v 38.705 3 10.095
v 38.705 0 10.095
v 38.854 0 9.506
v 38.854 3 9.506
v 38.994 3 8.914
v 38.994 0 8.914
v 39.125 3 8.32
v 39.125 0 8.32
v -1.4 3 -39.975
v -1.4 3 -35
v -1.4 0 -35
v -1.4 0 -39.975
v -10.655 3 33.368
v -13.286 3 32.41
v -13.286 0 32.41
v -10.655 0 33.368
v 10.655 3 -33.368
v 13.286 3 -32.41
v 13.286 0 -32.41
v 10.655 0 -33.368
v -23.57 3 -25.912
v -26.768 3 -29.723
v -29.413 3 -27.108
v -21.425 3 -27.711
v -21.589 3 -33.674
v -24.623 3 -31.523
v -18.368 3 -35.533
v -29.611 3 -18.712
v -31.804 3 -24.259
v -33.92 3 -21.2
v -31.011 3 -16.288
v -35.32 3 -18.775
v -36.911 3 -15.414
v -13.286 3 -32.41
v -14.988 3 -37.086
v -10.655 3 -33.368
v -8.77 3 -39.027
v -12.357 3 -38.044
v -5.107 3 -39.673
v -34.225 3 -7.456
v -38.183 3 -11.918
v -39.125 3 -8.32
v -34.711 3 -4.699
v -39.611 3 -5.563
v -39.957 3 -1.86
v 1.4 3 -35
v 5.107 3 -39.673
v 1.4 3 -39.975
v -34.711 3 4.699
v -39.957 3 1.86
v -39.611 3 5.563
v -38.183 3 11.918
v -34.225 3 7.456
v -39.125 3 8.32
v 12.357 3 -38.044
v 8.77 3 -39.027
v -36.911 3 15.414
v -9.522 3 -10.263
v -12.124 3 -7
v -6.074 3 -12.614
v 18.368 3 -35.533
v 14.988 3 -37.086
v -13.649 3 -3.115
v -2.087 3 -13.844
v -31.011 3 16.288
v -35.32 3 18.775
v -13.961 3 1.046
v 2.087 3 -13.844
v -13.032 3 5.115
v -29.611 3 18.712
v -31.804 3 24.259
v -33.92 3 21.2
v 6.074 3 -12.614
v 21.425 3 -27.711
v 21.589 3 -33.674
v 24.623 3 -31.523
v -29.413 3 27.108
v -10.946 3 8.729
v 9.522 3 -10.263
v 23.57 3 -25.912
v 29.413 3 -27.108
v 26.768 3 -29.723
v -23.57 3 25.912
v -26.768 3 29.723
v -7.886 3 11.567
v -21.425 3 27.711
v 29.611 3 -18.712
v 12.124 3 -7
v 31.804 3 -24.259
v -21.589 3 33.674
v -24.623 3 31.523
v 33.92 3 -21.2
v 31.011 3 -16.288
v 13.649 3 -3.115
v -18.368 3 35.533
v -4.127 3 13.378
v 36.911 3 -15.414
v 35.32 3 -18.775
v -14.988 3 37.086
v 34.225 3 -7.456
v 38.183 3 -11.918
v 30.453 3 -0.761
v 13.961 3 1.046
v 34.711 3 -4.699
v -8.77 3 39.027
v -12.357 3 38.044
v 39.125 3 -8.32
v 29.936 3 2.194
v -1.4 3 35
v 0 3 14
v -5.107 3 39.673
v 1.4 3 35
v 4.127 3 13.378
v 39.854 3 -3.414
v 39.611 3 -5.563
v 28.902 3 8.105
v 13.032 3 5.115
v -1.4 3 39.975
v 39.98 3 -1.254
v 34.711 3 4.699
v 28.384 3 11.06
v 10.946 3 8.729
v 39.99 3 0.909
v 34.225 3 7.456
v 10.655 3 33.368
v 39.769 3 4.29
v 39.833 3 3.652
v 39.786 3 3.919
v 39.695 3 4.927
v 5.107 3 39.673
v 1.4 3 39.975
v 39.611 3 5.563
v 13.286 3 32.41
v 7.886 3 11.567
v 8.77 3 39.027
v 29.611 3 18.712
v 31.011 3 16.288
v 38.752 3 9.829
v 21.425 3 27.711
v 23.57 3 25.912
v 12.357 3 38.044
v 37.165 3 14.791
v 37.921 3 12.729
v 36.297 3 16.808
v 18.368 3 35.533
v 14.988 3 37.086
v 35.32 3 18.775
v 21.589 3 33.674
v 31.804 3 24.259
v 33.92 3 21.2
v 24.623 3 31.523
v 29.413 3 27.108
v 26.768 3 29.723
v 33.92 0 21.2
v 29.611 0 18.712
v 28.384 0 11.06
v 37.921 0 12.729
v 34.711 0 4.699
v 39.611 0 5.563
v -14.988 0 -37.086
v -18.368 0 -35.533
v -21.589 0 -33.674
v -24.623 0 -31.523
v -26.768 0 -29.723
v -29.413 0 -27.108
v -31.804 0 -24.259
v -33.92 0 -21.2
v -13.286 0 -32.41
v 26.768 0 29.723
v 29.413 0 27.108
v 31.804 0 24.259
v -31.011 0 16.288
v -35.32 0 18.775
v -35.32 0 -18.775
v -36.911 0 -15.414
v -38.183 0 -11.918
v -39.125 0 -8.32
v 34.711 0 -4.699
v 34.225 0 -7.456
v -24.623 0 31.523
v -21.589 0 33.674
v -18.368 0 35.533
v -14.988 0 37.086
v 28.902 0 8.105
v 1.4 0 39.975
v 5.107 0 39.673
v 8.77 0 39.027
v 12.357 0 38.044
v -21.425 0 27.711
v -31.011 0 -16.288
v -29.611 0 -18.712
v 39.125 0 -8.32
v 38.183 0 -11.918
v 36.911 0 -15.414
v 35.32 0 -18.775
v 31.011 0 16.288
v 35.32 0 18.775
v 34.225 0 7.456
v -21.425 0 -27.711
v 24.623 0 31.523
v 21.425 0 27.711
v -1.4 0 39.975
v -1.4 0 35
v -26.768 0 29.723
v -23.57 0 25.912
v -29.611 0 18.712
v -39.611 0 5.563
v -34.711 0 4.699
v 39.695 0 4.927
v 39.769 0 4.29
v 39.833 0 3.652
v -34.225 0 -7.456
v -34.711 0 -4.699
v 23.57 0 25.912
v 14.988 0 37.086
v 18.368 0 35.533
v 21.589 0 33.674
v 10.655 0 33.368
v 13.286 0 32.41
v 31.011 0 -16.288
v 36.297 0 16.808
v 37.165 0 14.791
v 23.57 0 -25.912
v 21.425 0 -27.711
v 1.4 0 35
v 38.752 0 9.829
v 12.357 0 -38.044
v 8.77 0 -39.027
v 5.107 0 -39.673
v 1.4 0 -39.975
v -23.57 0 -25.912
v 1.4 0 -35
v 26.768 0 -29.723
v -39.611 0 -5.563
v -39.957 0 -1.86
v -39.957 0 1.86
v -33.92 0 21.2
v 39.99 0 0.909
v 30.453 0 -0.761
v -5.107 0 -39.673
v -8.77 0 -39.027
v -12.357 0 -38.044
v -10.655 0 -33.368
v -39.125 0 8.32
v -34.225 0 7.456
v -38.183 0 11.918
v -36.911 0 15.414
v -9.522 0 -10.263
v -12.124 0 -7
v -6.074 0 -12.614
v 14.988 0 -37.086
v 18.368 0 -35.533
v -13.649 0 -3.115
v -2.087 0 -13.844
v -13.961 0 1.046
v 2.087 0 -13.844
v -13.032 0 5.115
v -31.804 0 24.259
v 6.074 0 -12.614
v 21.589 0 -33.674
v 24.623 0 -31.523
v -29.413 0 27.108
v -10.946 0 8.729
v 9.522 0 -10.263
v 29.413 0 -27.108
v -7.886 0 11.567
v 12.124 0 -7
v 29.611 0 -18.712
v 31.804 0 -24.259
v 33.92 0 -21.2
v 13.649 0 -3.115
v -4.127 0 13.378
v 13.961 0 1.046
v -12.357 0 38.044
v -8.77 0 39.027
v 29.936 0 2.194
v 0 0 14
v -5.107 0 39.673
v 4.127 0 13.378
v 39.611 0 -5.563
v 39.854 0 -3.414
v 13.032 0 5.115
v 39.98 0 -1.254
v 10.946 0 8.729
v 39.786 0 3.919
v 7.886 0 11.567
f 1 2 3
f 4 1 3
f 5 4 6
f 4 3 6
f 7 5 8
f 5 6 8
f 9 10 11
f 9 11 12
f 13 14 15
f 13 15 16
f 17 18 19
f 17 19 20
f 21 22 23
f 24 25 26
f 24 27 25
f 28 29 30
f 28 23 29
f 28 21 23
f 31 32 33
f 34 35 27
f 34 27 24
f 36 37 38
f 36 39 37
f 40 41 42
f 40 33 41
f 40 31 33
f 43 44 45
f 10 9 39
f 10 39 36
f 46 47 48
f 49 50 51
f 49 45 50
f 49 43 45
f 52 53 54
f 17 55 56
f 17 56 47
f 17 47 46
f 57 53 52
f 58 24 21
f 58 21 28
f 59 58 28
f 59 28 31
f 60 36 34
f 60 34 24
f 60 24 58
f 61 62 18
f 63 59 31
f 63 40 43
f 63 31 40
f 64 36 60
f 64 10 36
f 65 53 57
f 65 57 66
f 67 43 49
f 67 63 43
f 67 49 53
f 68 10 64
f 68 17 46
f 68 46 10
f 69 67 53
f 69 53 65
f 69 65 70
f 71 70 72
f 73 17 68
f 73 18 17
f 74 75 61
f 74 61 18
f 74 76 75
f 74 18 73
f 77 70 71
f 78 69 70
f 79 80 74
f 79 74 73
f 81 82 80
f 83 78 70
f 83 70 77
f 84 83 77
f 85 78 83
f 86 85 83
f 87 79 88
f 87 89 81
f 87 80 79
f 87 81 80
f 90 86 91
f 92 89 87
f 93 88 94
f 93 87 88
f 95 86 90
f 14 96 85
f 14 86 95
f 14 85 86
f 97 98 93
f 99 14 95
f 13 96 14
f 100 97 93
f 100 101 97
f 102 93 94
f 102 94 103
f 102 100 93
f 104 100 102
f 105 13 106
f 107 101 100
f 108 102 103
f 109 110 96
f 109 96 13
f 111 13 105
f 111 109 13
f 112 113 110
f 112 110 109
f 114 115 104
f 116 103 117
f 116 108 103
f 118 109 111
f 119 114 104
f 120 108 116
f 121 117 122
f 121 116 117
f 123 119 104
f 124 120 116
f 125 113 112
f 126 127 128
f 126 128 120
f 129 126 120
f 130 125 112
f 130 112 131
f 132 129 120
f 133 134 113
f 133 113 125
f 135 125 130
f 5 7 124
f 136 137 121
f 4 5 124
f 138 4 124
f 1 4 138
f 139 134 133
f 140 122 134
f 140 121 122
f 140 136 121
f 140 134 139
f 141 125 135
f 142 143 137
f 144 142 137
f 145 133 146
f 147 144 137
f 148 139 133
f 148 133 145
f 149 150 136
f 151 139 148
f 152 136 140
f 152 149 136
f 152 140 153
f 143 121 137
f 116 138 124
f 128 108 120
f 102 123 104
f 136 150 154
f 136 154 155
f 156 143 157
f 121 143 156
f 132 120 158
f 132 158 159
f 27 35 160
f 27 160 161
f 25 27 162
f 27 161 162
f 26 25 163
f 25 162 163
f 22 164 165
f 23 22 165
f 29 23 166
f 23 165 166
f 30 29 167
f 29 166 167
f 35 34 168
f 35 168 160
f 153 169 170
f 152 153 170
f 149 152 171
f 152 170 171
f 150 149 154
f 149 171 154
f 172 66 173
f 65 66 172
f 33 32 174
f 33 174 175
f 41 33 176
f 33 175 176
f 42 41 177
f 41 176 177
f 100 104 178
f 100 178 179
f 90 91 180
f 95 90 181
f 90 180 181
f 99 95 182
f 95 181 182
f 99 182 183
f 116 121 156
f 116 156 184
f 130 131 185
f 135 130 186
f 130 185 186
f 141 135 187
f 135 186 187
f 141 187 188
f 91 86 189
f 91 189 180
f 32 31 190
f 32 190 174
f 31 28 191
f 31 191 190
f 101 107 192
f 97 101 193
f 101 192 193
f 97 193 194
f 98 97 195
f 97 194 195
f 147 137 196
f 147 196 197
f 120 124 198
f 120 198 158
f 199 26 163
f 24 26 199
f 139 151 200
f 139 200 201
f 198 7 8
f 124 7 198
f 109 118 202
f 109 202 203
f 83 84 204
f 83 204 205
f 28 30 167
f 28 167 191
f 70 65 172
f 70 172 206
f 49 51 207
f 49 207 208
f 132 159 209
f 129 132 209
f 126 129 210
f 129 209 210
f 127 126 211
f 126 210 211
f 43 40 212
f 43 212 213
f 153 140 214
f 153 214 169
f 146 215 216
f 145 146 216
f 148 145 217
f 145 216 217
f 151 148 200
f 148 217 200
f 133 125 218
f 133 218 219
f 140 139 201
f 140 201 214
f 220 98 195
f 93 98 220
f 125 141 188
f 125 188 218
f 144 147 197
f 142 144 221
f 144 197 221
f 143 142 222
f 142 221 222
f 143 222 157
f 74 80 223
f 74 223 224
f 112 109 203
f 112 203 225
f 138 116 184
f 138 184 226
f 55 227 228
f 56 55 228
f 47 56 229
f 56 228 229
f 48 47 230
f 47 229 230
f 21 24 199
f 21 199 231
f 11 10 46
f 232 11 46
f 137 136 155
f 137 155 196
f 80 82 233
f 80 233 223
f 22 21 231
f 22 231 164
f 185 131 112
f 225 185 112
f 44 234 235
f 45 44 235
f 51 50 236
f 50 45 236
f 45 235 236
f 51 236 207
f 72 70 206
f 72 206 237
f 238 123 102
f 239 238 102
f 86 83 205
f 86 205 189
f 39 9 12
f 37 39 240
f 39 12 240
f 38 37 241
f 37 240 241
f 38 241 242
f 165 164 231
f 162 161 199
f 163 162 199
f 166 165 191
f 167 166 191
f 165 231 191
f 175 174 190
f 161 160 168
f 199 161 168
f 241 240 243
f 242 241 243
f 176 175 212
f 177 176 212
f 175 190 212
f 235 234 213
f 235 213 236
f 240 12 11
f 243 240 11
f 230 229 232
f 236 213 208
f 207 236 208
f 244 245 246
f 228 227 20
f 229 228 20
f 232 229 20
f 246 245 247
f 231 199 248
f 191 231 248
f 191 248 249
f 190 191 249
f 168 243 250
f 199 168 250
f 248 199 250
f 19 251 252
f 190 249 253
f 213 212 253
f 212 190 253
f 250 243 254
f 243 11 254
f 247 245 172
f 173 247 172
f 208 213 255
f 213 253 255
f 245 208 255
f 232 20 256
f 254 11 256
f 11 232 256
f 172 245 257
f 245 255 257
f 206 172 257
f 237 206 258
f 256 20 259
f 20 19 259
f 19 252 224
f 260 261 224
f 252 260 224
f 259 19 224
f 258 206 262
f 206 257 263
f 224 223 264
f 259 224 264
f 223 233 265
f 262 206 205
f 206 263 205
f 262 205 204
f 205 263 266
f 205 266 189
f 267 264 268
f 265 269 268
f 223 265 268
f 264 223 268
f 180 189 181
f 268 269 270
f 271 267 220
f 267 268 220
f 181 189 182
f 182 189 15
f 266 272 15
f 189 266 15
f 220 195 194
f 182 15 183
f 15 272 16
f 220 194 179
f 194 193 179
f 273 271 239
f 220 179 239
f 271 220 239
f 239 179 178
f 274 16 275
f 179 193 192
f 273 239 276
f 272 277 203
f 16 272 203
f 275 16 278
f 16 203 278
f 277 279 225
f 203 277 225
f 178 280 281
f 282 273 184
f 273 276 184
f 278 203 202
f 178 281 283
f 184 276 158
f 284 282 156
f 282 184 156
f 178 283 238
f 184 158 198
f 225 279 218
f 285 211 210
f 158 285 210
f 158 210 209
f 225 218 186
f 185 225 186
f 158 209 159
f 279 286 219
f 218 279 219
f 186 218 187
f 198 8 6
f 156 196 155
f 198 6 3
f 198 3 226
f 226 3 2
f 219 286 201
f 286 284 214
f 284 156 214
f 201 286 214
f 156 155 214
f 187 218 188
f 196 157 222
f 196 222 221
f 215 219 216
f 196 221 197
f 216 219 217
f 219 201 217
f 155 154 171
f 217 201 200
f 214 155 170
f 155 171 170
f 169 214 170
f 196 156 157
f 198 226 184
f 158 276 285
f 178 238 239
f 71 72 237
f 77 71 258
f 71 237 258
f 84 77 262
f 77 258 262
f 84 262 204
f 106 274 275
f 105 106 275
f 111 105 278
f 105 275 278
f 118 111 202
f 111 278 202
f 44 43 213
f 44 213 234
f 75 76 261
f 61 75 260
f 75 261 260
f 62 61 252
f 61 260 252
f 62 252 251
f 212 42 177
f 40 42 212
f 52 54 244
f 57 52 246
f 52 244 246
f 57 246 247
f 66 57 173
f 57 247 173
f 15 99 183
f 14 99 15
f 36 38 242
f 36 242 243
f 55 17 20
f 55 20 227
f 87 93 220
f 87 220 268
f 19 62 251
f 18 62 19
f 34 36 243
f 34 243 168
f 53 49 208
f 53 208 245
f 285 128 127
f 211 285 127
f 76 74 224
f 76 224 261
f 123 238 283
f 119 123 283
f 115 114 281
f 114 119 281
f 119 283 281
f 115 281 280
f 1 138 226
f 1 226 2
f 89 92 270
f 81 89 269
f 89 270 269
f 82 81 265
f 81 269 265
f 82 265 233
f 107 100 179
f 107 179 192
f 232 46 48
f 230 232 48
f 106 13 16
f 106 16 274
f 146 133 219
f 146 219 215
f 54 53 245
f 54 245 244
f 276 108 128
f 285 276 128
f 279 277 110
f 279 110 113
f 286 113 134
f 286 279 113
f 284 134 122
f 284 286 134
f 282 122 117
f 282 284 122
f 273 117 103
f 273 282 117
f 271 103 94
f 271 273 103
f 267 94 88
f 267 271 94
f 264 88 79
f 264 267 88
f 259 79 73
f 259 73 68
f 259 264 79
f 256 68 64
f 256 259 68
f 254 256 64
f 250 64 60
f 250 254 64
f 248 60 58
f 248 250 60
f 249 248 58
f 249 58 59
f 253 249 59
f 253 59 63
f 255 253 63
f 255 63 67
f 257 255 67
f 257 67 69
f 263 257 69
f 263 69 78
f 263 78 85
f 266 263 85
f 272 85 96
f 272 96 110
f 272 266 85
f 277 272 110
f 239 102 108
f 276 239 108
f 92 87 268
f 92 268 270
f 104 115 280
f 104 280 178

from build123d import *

# Parameters (mm, degrees)
ESQUISSE1_R             = 40
ESQUISSE1_R_2           = 14
BOSS_EXTRU_1_DEPTH      = 3
ENL_V_MAT_EXTRU_1_REACH = 58.648
ESQUISSE2_W             = 2.8
ESQUISSE2_H             = 5
ENL_V_MAT_EXTRU_2_DEPTH = 10


with BuildPart() as part:
    # Esquisse1 → Boss.-Extru.1 (new body)
    with BuildSketch(Plane(origin=(0, 0, 0), x_dir=(1, 0, 0), z_dir=(0, 1, 0))):
        with Locations(Location((0, 0, 0), (0, 0, 270))):
            Circle(ESQUISSE1_R)
        with Locations(Location((0, 0, 0), (0, 0, 270))):
            Circle(ESQUISSE1_R_2, mode=Mode.SUBTRACT)
    extrude(amount=BOSS_EXTRU_1_DEPTH)

    # Esquisse2 → Enlèv. mat.-Extru.1 (cut, up to next)
    with BuildSketch(Plane(origin=(0, 3, 0), x_dir=(1, 0, 0), z_dir=(0, 1, 0)), mode=Mode.PRIVATE) as enl_v_mat_extru_1_sk1:
        Polygon((14.996375402, 37.108876631), (13.286274685, 32.410413527), (10.655135347, 33.368069928), (12.365236064, 38.066533032), align=None)
    enl_v_mat_extru_1_tool1 = extrude(enl_v_mat_extru_1_sk1.sketch, amount=-ENL_V_MAT_EXTRU_1_REACH, mode=Mode.PRIVATE) & part.part
    # Esquisse2 → Enlèv. mat.-Extru.1 (cut, up to next)
    with BuildSketch(Plane(origin=(0, 3, 0), x_dir=(1, 0, 0), z_dir=(0, 1, 0)), mode=Mode.PRIVATE) as enl_v_mat_extru_1_sk2:
        with Locations((0, 37.5)):
            Rectangle(ESQUISSE2_W, ESQUISSE2_H)
    enl_v_mat_extru_1_tool2 = extrude(enl_v_mat_extru_1_sk2.sketch, amount=-ENL_V_MAT_EXTRU_1_REACH, mode=Mode.PRIVATE) & part.part
    # Esquisse2 → Enlèv. mat.-Extru.1 (cut, up to next)
    with BuildSketch(Plane(origin=(0, 3, 0), x_dir=(1, 0, 0), z_dir=(0, 1, 0)), mode=Mode.PRIVATE) as enl_v_mat_extru_1_sk3:
        Polygon((26.783966608, 29.741875071), (23.570028559, 25.911652856), (21.425104119, 27.711458163), (24.639042167, 31.541680378), align=None)
    enl_v_mat_extru_1_tool3 = extrude(enl_v_mat_extru_1_sk3.sketch, amount=-ENL_V_MAT_EXTRU_1_REACH, mode=Mode.PRIVATE) & part.part
    # Esquisse2 → Enlèv. mat.-Extru.1 (cut, up to next)
    with BuildSketch(Plane(origin=(0, 3, 0), x_dir=(1, 0, 0), z_dir=(0, 1, 0)), mode=Mode.PRIVATE) as enl_v_mat_extru_1_sk4:
        Polygon((35.341016151, 18.787564435), (31.010889132, 16.287564435), (29.610889132, 18.712435565), (33.941016151, 21.212435565), align=None)
    enl_v_mat_extru_1_tool4 = extrude(enl_v_mat_extru_1_sk4.sketch, amount=-ENL_V_MAT_EXTRU_1_REACH, mode=Mode.PRIVATE) & part.part
    # Esquisse2 → Enlèv. mat.-Extru.1 (cut, up to next)
    with BuildSketch(Plane(origin=(0, 3, 0), x_dir=(1, 0, 0), z_dir=(0, 1, 0)), mode=Mode.PRIVATE) as enl_v_mat_extru_1_sk5:
        Polygon((39.635417569, 5.567196252), (34.711378804, 4.698955364), (34.225163907, 7.456417073), (39.149202672, 8.324657961), align=None)
    enl_v_mat_extru_1_tool5 = extrude(enl_v_mat_extru_1_sk5.sketch, amount=-ENL_V_MAT_EXTRU_1_REACH, mode=Mode.PRIVATE) & part.part
    # Esquisse2 → Enlèv. mat.-Extru.1 (cut, up to next)
    with BuildSketch(Plane(origin=(0, 3, 0), x_dir=(1, 0, 0), z_dir=(0, 1, 0)), mode=Mode.PRIVATE) as enl_v_mat_extru_1_sk6:
        Polygon((39.149202672, -8.324657961), (34.225163907, -7.456417073), (34.711378804, -4.698955364), (39.635417569, -5.567196252), align=None)
    enl_v_mat_extru_1_tool6 = extrude(enl_v_mat_extru_1_sk6.sketch, amount=-ENL_V_MAT_EXTRU_1_REACH, mode=Mode.PRIVATE) & part.part
    # Esquisse2 → Enlèv. mat.-Extru.1 (cut, up to next)
    with BuildSketch(Plane(origin=(0, 3, 0), x_dir=(1, 0, 0), z_dir=(0, 1, 0)), mode=Mode.PRIVATE) as enl_v_mat_extru_1_sk7:
        Polygon((33.941016151, -21.212435565), (29.610889132, -18.712435565), (31.010889132, -16.287564435), (35.341016151, -18.787564435), align=None)
    enl_v_mat_extru_1_tool7 = extrude(enl_v_mat_extru_1_sk7.sketch, amount=-ENL_V_MAT_EXTRU_1_REACH, mode=Mode.PRIVATE) & part.part
    # Esquisse2 → Enlèv. mat.-Extru.1 (cut, up to next)
    with BuildSketch(Plane(origin=(0, 3, 0), x_dir=(1, 0, 0), z_dir=(0, 1, 0)), mode=Mode.PRIVATE) as enl_v_mat_extru_1_sk8:
        Polygon((24.639042167, -31.541680378), (21.425104119, -27.711458163), (23.570028559, -25.911652856), (26.783966608, -29.741875071), align=None)
    enl_v_mat_extru_1_tool8 = extrude(enl_v_mat_extru_1_sk8.sketch, amount=-ENL_V_MAT_EXTRU_1_REACH, mode=Mode.PRIVATE) & part.part
    # Esquisse2 → Enlèv. mat.-Extru.1 (cut, up to next)
    with BuildSketch(Plane(origin=(0, 3, 0), x_dir=(1, 0, 0), z_dir=(0, 1, 0)), mode=Mode.PRIVATE) as enl_v_mat_extru_1_sk9:
        Polygon((12.365236064, -38.066533032), (10.655135347, -33.368069928), (13.286274686, -32.410413527), (14.996375402, -37.108876631), align=None)
    enl_v_mat_extru_1_tool9 = extrude(enl_v_mat_extru_1_sk9.sketch, amount=-ENL_V_MAT_EXTRU_1_REACH, mode=Mode.PRIVATE) & part.part
    # Esquisse2 → Enlèv. mat.-Extru.1 (cut, up to next)
    with BuildSketch(Plane(origin=(0, 3, 0), x_dir=(1, 0, 0), z_dir=(0, 1, 0)), mode=Mode.PRIVATE) as enl_v_mat_extru_1_sk10:
        with Locations((0, -37.5)):
            Rectangle(ESQUISSE2_W, ESQUISSE2_H)
    enl_v_mat_extru_1_tool10 = extrude(enl_v_mat_extru_1_sk10.sketch, amount=-ENL_V_MAT_EXTRU_1_REACH, mode=Mode.PRIVATE) & part.part
    # Esquisse2 → Enlèv. mat.-Extru.1 (cut, up to next)
    with BuildSketch(Plane(origin=(0, 3, 0), x_dir=(1, 0, 0), z_dir=(0, 1, 0)), mode=Mode.PRIVATE) as enl_v_mat_extru_1_sk11:
        Polygon((-14.996375402, -37.108876631), (-13.286274685, -32.410413527), (-10.655135347, -33.368069928), (-12.365236064, -38.066533032), align=None)
    enl_v_mat_extru_1_tool11 = extrude(enl_v_mat_extru_1_sk11.sketch, amount=-ENL_V_MAT_EXTRU_1_REACH, mode=Mode.PRIVATE) & part.part
    # Esquisse2 → Enlèv. mat.-Extru.1 (cut, up to next)
    with BuildSketch(Plane(origin=(0, 3, 0), x_dir=(1, 0, 0), z_dir=(0, 1, 0)), mode=Mode.PRIVATE) as enl_v_mat_extru_1_sk12:
        Polygon((-26.783966608, -29.741875071), (-23.570028559, -25.911652856), (-21.425104119, -27.711458163), (-24.639042167, -31.541680378), align=None)
    enl_v_mat_extru_1_tool12 = extrude(enl_v_mat_extru_1_sk12.sketch, amount=-ENL_V_MAT_EXTRU_1_REACH, mode=Mode.PRIVATE) & part.part
    # Esquisse2 → Enlèv. mat.-Extru.1 (cut, up to next)
    with BuildSketch(Plane(origin=(0, 3, 0), x_dir=(1, 0, 0), z_dir=(0, 1, 0)), mode=Mode.PRIVATE) as enl_v_mat_extru_1_sk13:
        Polygon((-35.341016151, -18.787564435), (-31.010889132, -16.287564435), (-29.610889132, -18.712435565), (-33.941016151, -21.212435565), align=None)
    enl_v_mat_extru_1_tool13 = extrude(enl_v_mat_extru_1_sk13.sketch, amount=-ENL_V_MAT_EXTRU_1_REACH, mode=Mode.PRIVATE) & part.part
    # Esquisse2 → Enlèv. mat.-Extru.1 (cut, up to next)
    with BuildSketch(Plane(origin=(0, 3, 0), x_dir=(1, 0, 0), z_dir=(0, 1, 0)), mode=Mode.PRIVATE) as enl_v_mat_extru_1_sk14:
        Polygon((-39.635417569, -5.567196252), (-34.711378804, -4.698955364), (-34.225163907, -7.456417073), (-39.149202672, -8.324657961), align=None)
    enl_v_mat_extru_1_tool14 = extrude(enl_v_mat_extru_1_sk14.sketch, amount=-ENL_V_MAT_EXTRU_1_REACH, mode=Mode.PRIVATE) & part.part
    # Esquisse2 → Enlèv. mat.-Extru.1 (cut, up to next)
    with BuildSketch(Plane(origin=(0, 3, 0), x_dir=(1, 0, 0), z_dir=(0, 1, 0)), mode=Mode.PRIVATE) as enl_v_mat_extru_1_sk15:
        Polygon((-39.149202672, 8.324657961), (-34.225163907, 7.456417073), (-34.711378804, 4.698955364), (-39.635417569, 5.567196252), align=None)
    enl_v_mat_extru_1_tool15 = extrude(enl_v_mat_extru_1_sk15.sketch, amount=-ENL_V_MAT_EXTRU_1_REACH, mode=Mode.PRIVATE) & part.part
    # Esquisse2 → Enlèv. mat.-Extru.1 (cut, up to next)
    with BuildSketch(Plane(origin=(0, 3, 0), x_dir=(1, 0, 0), z_dir=(0, 1, 0)), mode=Mode.PRIVATE) as enl_v_mat_extru_1_sk16:
        Polygon((-33.941016151, 21.212435565), (-29.610889132, 18.712435565), (-31.010889132, 16.287564435), (-35.341016151, 18.787564435), align=None)
    enl_v_mat_extru_1_tool16 = extrude(enl_v_mat_extru_1_sk16.sketch, amount=-ENL_V_MAT_EXTRU_1_REACH, mode=Mode.PRIVATE) & part.part
    # Esquisse2 → Enlèv. mat.-Extru.1 (cut, up to next)
    with BuildSketch(Plane(origin=(0, 3, 0), x_dir=(1, 0, 0), z_dir=(0, 1, 0)), mode=Mode.PRIVATE) as enl_v_mat_extru_1_sk17:
        Polygon((-24.639042167, 31.541680378), (-21.425104119, 27.711458163), (-23.570028559, 25.911652856), (-26.783966608, 29.741875071), align=None)
    enl_v_mat_extru_1_tool17 = extrude(enl_v_mat_extru_1_sk17.sketch, amount=-ENL_V_MAT_EXTRU_1_REACH, mode=Mode.PRIVATE) & part.part
    # Esquisse2 → Enlèv. mat.-Extru.1 (cut, up to next)
    with BuildSketch(Plane(origin=(0, 3, 0), x_dir=(1, 0, 0), z_dir=(0, 1, 0)), mode=Mode.PRIVATE) as enl_v_mat_extru_1_sk18:
        Polygon((-12.365236064, 38.066533032), (-10.655135347, 33.368069928), (-13.286274685, 32.410413527), (-14.996375402, 37.108876631), align=None)
    enl_v_mat_extru_1_tool18 = extrude(enl_v_mat_extru_1_sk18.sketch, amount=-ENL_V_MAT_EXTRU_1_REACH, mode=Mode.PRIVATE) & part.part
    add(enl_v_mat_extru_1_tool1.solids().sort_by_distance((12.825755, 3, -35.238473))[0], mode=Mode.SUBTRACT)
    add(enl_v_mat_extru_1_tool2.solids().sort_by_distance((0, 3, -37.5))[0], mode=Mode.SUBTRACT)
    add(enl_v_mat_extru_1_tool3.solids().sort_by_distance((24.104535, 3, -28.726667))[0], mode=Mode.SUBTRACT)
    add(enl_v_mat_extru_1_tool4.solids().sort_by_distance((32.475953, 3, -18.75))[0], mode=Mode.SUBTRACT)
    add(enl_v_mat_extru_1_tool5.solids().sort_by_distance((36.930291, 3, -6.511807))[0], mode=Mode.SUBTRACT)
    add(enl_v_mat_extru_1_tool6.solids().sort_by_distance((36.930291, 3, 6.511807))[0], mode=Mode.SUBTRACT)
    add(enl_v_mat_extru_1_tool7.solids().sort_by_distance((32.475953, 3, 18.75))[0], mode=Mode.SUBTRACT)
    add(enl_v_mat_extru_1_tool8.solids().sort_by_distance((24.104535, 3, 28.726667))[0], mode=Mode.SUBTRACT)
    add(enl_v_mat_extru_1_tool9.solids().sort_by_distance((12.825755, 3, 35.238473))[0], mode=Mode.SUBTRACT)
    add(enl_v_mat_extru_1_tool10.solids().sort_by_distance((0, 3, 37.5))[0], mode=Mode.SUBTRACT)
    add(enl_v_mat_extru_1_tool11.solids().sort_by_distance((-12.825755, 3, 35.238473))[0], mode=Mode.SUBTRACT)
    add(enl_v_mat_extru_1_tool12.solids().sort_by_distance((-24.104535, 3, 28.726667))[0], mode=Mode.SUBTRACT)
    add(enl_v_mat_extru_1_tool13.solids().sort_by_distance((-32.475953, 3, 18.75))[0], mode=Mode.SUBTRACT)
    add(enl_v_mat_extru_1_tool14.solids().sort_by_distance((-36.930291, 3, 6.511807))[0], mode=Mode.SUBTRACT)
    add(enl_v_mat_extru_1_tool15.solids().sort_by_distance((-36.930291, 3, -6.511807))[0], mode=Mode.SUBTRACT)
    add(enl_v_mat_extru_1_tool16.solids().sort_by_distance((-32.475953, 3, -18.75))[0], mode=Mode.SUBTRACT)
    add(enl_v_mat_extru_1_tool17.solids().sort_by_distance((-24.104535, 3, -28.726667))[0], mode=Mode.SUBTRACT)
    add(enl_v_mat_extru_1_tool18.solids().sort_by_distance((-12.825755, 3, -35.238473))[0], mode=Mode.SUBTRACT)

    # Esquisse3 → Enlèv. mat.-Extru.2 (cut)
    with BuildSketch(Plane(origin=(0, 3, 0), x_dir=(1, 0, 0), z_dir=(0, 1, 0))):
        Polygon((30.453325998, 0.760699996), (29.93607291, -2.194371787), (39.786312187, -3.918548747), (40.303565275, -0.963476964), align=None)
        Polygon((28.384313646, -11.059587136), (28.901566734, -8.104515353), (38.751806011, -9.828692313), (38.234552923, -12.783764096), align=None)
    extrude(amount=-ENL_V_MAT_EXTRU_2_DEPTH, mode=Mode.SUBTRACT)


solid = part.part
